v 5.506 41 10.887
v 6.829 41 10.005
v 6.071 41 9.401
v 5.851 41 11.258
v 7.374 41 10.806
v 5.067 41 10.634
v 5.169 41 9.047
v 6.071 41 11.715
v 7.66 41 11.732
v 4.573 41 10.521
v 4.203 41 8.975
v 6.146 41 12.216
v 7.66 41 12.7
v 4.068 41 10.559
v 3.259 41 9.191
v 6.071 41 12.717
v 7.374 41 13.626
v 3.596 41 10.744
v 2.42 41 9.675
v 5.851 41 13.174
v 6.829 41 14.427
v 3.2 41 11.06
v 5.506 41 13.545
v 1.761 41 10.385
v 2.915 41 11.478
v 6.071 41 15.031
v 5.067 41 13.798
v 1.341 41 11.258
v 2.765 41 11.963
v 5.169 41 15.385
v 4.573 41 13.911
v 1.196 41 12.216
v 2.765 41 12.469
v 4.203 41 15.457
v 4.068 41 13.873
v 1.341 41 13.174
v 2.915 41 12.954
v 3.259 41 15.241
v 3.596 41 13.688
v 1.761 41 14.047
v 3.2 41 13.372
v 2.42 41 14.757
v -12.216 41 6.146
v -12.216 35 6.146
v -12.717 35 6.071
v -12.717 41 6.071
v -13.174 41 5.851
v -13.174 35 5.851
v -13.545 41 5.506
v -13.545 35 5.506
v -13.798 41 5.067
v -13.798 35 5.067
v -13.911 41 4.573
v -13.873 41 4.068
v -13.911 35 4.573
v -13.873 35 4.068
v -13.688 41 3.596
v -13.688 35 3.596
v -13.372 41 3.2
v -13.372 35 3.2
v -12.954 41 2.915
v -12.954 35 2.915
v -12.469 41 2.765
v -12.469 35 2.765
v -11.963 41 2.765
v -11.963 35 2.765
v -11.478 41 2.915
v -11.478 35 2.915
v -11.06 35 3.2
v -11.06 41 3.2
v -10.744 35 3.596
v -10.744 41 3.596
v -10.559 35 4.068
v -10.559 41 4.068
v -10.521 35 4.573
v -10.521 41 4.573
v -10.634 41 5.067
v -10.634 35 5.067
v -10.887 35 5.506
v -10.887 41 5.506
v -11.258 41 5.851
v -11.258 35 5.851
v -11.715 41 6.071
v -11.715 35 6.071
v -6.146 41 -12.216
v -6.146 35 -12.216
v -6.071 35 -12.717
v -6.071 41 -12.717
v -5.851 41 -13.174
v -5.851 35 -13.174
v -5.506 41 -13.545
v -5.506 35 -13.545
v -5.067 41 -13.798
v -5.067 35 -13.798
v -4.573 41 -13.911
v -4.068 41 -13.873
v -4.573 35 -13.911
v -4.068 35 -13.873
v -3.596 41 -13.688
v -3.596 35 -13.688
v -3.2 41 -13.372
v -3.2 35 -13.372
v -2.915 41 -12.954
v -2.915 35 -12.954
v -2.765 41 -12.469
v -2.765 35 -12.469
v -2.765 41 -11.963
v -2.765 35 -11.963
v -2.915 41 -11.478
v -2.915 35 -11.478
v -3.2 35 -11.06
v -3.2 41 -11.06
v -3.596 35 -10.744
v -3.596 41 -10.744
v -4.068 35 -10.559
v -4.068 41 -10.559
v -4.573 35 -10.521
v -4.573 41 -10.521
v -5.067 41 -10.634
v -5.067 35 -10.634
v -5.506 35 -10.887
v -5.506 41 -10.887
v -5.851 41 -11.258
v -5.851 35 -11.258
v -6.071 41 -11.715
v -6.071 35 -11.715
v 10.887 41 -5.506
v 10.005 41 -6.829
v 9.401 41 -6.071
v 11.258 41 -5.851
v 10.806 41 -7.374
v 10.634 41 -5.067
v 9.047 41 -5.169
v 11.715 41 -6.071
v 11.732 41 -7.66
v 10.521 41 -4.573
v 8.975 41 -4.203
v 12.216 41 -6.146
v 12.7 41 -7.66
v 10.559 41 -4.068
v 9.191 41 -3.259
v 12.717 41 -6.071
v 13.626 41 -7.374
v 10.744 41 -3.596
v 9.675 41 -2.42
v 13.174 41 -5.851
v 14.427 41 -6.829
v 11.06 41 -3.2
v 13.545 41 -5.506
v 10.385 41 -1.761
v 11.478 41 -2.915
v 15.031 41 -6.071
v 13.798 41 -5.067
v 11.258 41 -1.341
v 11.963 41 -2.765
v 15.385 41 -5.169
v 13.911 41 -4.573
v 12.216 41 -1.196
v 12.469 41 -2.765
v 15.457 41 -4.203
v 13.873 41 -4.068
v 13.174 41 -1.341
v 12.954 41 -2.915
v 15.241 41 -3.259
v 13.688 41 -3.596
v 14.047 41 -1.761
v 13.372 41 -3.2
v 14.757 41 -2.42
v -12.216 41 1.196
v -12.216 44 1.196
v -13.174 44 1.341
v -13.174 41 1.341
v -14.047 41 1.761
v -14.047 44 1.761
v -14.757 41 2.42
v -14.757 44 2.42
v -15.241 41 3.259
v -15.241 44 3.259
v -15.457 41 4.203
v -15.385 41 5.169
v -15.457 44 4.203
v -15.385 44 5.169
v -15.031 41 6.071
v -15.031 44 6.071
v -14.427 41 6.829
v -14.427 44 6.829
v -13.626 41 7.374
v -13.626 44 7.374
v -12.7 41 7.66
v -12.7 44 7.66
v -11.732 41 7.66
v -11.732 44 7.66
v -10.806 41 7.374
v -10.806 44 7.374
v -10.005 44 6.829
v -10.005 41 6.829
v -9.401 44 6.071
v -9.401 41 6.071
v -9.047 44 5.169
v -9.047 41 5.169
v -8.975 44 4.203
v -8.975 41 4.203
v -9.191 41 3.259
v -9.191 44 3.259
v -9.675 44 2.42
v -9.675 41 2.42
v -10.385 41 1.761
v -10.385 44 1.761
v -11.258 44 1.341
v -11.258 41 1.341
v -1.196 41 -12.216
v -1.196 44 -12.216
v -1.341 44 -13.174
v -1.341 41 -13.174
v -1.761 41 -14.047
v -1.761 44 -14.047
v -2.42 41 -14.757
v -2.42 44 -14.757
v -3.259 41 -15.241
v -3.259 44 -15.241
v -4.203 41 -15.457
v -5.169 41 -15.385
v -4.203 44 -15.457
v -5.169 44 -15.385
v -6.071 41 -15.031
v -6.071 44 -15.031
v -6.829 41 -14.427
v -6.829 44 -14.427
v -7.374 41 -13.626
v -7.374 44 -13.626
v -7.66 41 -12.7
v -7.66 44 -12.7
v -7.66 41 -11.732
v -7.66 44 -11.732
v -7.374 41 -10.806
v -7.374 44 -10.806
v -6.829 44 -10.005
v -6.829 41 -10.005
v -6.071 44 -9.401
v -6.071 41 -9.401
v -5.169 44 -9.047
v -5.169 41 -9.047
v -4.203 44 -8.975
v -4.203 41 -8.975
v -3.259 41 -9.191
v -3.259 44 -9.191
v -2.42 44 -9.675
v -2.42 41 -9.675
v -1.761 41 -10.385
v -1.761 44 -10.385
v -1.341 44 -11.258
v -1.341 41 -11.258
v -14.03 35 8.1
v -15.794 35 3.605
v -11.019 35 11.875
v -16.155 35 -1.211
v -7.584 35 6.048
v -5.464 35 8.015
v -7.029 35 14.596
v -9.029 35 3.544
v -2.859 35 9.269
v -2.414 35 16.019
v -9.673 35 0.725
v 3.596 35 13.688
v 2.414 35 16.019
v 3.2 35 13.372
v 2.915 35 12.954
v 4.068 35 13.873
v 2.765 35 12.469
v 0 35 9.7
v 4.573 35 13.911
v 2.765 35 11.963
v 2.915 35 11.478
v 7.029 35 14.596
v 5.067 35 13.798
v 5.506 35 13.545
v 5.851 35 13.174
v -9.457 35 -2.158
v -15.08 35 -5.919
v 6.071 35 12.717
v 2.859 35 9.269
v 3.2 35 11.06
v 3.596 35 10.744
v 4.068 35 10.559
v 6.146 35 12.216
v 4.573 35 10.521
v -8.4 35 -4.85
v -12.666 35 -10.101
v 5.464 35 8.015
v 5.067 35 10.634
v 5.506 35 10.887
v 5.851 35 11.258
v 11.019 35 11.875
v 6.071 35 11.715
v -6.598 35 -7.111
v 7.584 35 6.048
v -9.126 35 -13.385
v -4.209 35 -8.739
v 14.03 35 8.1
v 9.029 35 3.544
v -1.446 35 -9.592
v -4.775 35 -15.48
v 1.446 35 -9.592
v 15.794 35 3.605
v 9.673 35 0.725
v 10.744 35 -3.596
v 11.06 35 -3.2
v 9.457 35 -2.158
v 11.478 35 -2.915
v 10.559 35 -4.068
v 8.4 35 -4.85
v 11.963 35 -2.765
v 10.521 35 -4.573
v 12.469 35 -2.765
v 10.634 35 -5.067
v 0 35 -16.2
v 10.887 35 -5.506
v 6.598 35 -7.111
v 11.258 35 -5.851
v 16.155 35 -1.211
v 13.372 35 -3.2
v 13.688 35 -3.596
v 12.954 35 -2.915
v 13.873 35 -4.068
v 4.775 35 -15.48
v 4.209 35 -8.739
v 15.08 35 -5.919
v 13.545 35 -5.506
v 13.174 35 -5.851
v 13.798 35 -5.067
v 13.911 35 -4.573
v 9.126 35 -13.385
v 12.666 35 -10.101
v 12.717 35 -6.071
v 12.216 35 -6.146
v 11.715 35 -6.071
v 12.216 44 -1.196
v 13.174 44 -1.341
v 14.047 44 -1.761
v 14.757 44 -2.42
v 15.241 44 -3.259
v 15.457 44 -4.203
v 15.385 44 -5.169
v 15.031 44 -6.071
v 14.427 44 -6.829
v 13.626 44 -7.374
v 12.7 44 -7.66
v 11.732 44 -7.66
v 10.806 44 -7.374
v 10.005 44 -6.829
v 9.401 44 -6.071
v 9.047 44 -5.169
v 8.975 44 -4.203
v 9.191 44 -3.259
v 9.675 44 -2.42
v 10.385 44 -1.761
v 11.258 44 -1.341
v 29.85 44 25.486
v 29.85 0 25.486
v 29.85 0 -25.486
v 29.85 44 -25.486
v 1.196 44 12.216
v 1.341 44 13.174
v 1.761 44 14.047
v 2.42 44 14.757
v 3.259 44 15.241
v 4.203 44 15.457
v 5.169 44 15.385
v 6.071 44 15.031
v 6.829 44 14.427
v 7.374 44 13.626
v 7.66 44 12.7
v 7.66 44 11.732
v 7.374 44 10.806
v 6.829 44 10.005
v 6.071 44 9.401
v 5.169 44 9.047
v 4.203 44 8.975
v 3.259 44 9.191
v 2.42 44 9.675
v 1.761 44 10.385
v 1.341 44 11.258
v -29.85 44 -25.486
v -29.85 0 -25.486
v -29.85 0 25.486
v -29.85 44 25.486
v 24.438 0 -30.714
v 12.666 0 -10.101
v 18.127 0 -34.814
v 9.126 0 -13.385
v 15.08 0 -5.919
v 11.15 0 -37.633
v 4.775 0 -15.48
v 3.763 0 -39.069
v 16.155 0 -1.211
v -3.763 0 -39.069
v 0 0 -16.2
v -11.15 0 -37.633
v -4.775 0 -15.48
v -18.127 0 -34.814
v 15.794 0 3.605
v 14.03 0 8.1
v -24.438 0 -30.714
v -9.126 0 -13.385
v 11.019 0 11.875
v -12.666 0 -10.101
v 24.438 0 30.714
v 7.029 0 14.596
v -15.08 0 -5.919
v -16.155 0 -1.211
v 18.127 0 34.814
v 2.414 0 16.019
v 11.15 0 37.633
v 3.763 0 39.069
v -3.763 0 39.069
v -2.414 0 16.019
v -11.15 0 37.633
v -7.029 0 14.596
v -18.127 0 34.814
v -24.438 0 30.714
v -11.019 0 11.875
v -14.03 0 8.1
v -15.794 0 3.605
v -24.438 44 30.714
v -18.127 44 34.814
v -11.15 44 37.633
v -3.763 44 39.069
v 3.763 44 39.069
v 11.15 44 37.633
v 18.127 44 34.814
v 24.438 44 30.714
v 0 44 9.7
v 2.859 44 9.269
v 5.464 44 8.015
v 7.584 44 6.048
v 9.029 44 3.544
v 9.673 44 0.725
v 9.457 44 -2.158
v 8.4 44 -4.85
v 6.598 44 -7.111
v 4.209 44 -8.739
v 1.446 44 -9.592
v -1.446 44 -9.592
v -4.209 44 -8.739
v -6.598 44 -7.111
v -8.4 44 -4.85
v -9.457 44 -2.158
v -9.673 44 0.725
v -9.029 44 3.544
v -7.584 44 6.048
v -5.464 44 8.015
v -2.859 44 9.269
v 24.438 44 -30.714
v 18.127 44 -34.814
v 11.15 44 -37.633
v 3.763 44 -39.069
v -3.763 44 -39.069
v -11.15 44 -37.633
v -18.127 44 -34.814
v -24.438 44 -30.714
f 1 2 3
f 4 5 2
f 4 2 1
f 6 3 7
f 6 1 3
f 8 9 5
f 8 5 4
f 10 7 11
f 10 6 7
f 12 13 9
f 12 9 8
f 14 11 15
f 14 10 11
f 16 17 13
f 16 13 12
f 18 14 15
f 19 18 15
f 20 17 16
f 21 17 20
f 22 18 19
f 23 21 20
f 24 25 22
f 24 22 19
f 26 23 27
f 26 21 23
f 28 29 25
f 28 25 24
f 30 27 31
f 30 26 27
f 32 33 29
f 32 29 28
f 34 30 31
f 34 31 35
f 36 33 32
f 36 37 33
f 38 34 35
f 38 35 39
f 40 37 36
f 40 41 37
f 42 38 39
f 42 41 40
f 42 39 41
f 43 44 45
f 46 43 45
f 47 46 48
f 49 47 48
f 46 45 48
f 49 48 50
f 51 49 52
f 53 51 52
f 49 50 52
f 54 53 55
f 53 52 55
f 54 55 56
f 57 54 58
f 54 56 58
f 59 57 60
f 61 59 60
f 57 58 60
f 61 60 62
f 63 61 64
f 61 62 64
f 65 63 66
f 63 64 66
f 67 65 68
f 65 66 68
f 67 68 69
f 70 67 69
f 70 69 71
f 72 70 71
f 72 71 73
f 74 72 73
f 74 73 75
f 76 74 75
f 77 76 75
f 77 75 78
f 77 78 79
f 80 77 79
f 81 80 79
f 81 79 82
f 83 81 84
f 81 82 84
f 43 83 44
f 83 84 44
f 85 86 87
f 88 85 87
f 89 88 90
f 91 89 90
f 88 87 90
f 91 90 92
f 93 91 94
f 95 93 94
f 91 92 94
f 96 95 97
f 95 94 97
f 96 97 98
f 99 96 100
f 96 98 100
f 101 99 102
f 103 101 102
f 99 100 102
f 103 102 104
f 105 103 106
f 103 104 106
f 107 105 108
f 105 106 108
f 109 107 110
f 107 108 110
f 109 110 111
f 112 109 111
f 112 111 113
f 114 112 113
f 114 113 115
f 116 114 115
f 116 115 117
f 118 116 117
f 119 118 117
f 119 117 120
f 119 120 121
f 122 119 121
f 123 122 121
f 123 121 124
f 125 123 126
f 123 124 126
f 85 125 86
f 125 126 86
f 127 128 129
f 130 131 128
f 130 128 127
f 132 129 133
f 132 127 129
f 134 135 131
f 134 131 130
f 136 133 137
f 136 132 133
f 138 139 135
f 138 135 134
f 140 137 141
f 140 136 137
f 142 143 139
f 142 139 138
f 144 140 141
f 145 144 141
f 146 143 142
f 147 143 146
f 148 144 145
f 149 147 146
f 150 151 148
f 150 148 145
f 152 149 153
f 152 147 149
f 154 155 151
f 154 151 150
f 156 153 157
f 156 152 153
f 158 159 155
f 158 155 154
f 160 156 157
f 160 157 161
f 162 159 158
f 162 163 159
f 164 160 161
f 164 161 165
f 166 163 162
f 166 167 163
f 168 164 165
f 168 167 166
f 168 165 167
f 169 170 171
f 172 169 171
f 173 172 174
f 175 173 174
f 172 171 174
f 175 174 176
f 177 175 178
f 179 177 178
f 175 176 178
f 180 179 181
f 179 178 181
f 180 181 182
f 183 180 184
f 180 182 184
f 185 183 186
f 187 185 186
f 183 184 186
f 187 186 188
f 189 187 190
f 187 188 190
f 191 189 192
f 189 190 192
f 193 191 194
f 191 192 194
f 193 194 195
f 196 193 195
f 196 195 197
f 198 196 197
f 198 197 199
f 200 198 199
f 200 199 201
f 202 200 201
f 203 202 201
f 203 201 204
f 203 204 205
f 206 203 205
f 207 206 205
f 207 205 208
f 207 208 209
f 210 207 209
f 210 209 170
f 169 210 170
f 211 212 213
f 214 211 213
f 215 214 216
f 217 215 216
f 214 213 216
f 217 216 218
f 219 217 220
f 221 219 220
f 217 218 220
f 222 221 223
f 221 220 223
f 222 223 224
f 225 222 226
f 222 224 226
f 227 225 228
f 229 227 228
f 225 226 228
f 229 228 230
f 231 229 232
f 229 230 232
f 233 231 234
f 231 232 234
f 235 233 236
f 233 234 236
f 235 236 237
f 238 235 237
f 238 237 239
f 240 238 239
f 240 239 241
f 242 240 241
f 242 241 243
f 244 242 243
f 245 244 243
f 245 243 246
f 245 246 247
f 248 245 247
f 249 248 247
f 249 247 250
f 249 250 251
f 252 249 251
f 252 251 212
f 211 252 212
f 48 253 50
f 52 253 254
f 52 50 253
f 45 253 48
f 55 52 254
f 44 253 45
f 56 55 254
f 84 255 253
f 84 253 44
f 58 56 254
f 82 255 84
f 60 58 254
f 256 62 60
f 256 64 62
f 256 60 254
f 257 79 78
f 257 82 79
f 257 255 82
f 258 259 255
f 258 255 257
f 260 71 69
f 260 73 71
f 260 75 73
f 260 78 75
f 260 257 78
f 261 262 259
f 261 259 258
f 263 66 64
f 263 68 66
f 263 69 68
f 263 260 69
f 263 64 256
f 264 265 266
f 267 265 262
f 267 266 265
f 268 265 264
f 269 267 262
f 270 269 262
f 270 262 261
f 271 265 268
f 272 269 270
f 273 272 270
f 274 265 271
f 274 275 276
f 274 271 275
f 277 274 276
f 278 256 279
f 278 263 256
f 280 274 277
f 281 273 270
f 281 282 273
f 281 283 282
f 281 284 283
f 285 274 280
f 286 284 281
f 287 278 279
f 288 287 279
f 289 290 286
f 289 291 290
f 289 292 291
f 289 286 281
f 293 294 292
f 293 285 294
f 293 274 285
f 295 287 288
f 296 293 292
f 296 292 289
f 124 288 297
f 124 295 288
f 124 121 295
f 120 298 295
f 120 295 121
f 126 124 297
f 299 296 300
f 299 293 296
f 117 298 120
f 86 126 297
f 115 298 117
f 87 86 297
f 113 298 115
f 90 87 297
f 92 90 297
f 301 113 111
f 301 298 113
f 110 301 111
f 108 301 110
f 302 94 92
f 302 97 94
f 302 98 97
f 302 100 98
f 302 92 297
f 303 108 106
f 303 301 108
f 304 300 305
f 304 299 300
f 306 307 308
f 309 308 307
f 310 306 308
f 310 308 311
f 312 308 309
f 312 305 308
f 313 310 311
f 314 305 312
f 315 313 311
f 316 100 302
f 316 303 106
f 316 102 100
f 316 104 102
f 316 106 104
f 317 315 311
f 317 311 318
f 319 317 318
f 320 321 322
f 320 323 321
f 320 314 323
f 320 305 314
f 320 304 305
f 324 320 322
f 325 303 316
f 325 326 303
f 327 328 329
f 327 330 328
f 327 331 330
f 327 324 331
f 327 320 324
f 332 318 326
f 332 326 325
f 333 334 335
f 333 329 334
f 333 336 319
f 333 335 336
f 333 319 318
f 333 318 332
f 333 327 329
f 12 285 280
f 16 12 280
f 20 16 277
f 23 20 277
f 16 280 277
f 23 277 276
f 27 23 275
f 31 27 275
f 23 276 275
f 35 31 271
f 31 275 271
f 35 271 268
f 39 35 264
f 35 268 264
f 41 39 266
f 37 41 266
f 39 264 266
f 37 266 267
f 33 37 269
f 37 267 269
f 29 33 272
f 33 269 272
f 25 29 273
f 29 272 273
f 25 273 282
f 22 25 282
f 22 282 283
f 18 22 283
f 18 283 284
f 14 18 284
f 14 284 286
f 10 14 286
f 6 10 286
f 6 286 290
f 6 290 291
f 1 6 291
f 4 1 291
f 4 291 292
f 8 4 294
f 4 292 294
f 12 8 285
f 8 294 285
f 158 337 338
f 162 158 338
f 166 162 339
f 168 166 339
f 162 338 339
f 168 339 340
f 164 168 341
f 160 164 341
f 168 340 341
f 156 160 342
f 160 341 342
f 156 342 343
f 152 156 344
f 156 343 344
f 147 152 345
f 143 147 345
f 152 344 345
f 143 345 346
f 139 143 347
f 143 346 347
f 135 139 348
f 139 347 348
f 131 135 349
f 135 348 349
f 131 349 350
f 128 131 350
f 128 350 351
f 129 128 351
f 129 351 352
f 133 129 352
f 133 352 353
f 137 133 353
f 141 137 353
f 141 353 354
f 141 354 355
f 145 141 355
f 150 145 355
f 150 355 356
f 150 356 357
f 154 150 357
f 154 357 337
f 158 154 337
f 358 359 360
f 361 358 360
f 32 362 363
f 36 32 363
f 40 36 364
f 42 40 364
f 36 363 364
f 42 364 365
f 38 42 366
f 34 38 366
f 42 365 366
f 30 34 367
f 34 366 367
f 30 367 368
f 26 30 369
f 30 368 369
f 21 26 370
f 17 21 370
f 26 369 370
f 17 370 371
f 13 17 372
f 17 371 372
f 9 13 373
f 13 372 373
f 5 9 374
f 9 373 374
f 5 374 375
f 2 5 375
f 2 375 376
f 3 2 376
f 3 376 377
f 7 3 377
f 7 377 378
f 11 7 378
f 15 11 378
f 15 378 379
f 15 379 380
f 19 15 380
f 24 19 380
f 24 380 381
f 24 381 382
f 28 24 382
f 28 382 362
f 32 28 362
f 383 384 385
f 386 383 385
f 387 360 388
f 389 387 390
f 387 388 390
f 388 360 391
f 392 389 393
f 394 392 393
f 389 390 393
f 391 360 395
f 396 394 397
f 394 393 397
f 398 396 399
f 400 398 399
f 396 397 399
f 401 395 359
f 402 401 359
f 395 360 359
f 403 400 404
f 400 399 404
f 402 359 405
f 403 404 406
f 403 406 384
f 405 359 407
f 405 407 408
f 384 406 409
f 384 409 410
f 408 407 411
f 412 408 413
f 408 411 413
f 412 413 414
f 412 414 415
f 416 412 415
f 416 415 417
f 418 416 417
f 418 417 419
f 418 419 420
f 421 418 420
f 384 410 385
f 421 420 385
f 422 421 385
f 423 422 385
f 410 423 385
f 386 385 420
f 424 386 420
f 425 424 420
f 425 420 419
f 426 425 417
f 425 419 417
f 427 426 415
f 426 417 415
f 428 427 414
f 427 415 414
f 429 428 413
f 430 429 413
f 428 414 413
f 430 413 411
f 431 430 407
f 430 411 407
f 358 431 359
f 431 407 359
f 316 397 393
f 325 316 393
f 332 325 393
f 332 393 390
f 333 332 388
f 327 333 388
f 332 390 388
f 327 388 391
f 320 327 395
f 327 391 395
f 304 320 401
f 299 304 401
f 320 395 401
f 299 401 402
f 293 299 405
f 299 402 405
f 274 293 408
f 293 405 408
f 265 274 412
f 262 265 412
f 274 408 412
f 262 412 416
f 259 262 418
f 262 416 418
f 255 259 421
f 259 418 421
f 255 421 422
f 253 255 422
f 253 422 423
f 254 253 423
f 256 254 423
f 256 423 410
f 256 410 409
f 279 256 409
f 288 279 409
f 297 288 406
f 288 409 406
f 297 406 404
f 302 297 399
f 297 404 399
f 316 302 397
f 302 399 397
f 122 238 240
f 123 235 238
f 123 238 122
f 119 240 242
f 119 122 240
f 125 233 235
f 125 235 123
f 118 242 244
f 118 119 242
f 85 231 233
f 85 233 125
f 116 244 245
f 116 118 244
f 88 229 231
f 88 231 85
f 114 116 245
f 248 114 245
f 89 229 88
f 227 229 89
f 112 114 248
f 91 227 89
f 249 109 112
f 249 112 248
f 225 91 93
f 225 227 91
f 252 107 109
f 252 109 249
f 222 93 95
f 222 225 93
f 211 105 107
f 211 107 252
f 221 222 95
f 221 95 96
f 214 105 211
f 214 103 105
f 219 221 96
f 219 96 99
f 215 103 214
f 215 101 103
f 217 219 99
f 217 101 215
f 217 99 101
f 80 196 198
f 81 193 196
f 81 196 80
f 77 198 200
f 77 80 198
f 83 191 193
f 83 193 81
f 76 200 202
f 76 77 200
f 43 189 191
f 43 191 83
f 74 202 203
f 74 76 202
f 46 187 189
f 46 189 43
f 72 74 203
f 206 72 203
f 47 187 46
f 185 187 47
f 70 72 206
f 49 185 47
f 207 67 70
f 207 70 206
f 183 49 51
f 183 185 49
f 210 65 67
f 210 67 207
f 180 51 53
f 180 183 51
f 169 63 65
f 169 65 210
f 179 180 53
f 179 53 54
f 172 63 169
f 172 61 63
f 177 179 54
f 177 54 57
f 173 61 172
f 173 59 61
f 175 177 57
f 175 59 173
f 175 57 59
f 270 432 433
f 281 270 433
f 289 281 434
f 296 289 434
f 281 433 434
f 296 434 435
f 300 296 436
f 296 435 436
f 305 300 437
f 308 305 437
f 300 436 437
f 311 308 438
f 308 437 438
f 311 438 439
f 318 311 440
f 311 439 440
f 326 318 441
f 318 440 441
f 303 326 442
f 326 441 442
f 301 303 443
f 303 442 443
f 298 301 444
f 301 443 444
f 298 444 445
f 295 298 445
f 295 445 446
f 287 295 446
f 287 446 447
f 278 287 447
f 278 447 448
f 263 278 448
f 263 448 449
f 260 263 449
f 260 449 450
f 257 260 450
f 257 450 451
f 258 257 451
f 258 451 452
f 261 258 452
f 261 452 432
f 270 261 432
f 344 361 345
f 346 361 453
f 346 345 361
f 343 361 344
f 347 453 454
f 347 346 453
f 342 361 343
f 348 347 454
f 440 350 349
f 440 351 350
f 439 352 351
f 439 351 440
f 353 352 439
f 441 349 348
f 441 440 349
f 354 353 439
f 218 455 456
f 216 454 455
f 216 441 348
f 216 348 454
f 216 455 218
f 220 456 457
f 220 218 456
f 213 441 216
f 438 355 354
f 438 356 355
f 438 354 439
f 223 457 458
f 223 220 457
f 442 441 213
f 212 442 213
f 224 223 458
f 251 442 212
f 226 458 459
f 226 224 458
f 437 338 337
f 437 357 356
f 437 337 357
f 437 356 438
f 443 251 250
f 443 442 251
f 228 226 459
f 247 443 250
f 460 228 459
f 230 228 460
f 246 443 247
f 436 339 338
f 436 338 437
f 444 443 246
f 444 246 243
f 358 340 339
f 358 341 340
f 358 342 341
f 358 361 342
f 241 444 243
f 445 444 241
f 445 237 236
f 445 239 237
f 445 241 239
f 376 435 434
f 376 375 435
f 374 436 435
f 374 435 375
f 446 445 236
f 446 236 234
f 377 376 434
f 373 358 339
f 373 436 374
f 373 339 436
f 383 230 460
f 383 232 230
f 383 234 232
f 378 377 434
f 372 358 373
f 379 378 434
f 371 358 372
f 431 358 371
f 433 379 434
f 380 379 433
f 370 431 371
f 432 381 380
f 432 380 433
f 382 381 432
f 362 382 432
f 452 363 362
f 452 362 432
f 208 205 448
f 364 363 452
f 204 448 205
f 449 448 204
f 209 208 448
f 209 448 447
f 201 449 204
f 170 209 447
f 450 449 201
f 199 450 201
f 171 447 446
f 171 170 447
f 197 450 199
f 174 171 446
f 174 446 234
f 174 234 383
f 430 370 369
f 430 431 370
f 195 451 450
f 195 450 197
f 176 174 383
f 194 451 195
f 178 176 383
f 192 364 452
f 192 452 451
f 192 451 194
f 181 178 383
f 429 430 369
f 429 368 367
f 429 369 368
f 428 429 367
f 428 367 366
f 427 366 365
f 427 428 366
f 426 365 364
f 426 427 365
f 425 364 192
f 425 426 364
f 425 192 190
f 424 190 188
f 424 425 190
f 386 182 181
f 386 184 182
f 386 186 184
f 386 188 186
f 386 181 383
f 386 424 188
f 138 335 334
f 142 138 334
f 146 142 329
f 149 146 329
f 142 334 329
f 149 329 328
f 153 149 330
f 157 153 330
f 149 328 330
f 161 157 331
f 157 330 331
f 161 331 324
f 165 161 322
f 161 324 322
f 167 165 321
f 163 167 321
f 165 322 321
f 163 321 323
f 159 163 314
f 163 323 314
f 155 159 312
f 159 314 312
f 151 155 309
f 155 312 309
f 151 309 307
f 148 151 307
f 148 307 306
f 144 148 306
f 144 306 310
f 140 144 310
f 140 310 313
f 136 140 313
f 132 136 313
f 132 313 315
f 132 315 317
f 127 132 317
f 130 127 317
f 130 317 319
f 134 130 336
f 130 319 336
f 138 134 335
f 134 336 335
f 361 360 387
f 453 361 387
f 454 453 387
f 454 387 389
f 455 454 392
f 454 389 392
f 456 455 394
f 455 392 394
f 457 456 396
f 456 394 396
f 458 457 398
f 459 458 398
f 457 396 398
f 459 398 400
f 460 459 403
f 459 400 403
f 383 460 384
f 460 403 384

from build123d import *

# Parameters (mm, degrees)
BOSS_EXTRUDE1_DEPTH            = 44
CBORE_FOR_M3_SHCS1_D           = 3.4
CBORE_FOR_M3_SHCS1_CBORE_D     = 6.5
CBORE_FOR_M3_SHCS1_CBORE_DEPTH = 3
CIRPATTERN1_COUNT              = 4
SKETCH4_R                      = 16.2
CUT_EXTRUDE1_DEPTH             = 35
SKETCH5_R                      = 9.7
CUT_EXTRUDE2_DEPTH             = 66.498740446
BOSS_EXTRUDE2_DEPTH            = 44


with BuildPart() as part:
    # Sketch1 → Boss-Extrude1 (new body)
    with BuildSketch(Plane(origin=(0, 0, 0), x_dir=(1, 0, 0), z_dir=(0, 1, 0))):
        with BuildLine():
            Line((-29.85, 23.917357714), (-29.85, -23.917357714))
            ThreePointArc((-29.85, -23.917357714), (0, -38.25), (29.85, -23.917357714))
            Line((29.85, -23.917357714), (29.85, 23.917357714))
            ThreePointArc((29.85, 23.917357714), (0, 38.25), (-29.85, 23.917357714))
        make_face()
    extrude(amount=BOSS_EXTRUDE1_DEPTH)

    # CBORE for M3 SHCS1 (through all)
    with Locations(Plane(origin=(0, 44, 0), x_dir=(1, 0, 0), z_dir=(0, 1, 0))):
        with Locations((-4.446261863, 12.21600407)):
            cbore_for_m3_shcs1 = CounterBoreHole(CBORE_FOR_M3_SHCS1_D / 2, CBORE_FOR_M3_SHCS1_CBORE_D / 2, CBORE_FOR_M3_SHCS1_CBORE_DEPTH)

    # CirPattern1: CBORE for M3 SHCS1 ×4 about axis
    cirpattern1_axis = Axis((0, 0, 0), (0, 1, 0))
    for i in range(1, CIRPATTERN1_COUNT):
        add(cbore_for_m3_shcs1.rotate(cirpattern1_axis, i * 360 / CIRPATTERN1_COUNT), mode=Mode.SUBTRACT)

    # Sketch4 → Cut-Extrude1 (cut)
    with BuildSketch(Plane.XZ):
        with Locations(Location((0, 0, 0), (0, 0, 270))):
            Circle(SKETCH4_R)
    extrude(amount=-CUT_EXTRUDE1_DEPTH, mode=Mode.SUBTRACT)

    # Sketch5 → Cut-Extrude2 (cut, through all)
    with BuildSketch(Plane(origin=(0, 44, 0), x_dir=(1, 0, 0), z_dir=(0, 1, 0))):
        with Locations(Location((0, 0, 0), (0, 0, 270))):
            Circle(SKETCH5_R)
    extrude(amount=-CUT_EXTRUDE2_DEPTH, mode=Mode.SUBTRACT)

    # Sketch7 → Boss-Extrude2 (add)
    with BuildSketch(Plane.XZ):
        with BuildLine():
            Line((-29.85, 23.917357714), (-29.85, 25.486074629))
            ThreePointArc((-29.85, 25.486074629), (0, 39.25), (29.85, 25.486074629))
            Line((29.85, 25.486074629), (29.85, 23.917357714))
            ThreePointArc((29.85, 23.917357714), (0, 38.25), (-29.85, 23.917357714))
        make_face()
        with BuildLine():
            Line((29.85, -23.917357714), (29.85, -25.486074629))
            ThreePointArc((29.85, -25.486074629), (0, -39.25), (-29.85, -25.486074629))
            Line((-29.85, -25.486074629), (-29.85, -23.917357714))
            ThreePointArc((-29.85, -23.917357714), (0, -38.25), (29.85, -23.917357714))
        make_face()
    extrude(amount=-BOSS_EXTRUDE2_DEPTH)


solid = part.part
